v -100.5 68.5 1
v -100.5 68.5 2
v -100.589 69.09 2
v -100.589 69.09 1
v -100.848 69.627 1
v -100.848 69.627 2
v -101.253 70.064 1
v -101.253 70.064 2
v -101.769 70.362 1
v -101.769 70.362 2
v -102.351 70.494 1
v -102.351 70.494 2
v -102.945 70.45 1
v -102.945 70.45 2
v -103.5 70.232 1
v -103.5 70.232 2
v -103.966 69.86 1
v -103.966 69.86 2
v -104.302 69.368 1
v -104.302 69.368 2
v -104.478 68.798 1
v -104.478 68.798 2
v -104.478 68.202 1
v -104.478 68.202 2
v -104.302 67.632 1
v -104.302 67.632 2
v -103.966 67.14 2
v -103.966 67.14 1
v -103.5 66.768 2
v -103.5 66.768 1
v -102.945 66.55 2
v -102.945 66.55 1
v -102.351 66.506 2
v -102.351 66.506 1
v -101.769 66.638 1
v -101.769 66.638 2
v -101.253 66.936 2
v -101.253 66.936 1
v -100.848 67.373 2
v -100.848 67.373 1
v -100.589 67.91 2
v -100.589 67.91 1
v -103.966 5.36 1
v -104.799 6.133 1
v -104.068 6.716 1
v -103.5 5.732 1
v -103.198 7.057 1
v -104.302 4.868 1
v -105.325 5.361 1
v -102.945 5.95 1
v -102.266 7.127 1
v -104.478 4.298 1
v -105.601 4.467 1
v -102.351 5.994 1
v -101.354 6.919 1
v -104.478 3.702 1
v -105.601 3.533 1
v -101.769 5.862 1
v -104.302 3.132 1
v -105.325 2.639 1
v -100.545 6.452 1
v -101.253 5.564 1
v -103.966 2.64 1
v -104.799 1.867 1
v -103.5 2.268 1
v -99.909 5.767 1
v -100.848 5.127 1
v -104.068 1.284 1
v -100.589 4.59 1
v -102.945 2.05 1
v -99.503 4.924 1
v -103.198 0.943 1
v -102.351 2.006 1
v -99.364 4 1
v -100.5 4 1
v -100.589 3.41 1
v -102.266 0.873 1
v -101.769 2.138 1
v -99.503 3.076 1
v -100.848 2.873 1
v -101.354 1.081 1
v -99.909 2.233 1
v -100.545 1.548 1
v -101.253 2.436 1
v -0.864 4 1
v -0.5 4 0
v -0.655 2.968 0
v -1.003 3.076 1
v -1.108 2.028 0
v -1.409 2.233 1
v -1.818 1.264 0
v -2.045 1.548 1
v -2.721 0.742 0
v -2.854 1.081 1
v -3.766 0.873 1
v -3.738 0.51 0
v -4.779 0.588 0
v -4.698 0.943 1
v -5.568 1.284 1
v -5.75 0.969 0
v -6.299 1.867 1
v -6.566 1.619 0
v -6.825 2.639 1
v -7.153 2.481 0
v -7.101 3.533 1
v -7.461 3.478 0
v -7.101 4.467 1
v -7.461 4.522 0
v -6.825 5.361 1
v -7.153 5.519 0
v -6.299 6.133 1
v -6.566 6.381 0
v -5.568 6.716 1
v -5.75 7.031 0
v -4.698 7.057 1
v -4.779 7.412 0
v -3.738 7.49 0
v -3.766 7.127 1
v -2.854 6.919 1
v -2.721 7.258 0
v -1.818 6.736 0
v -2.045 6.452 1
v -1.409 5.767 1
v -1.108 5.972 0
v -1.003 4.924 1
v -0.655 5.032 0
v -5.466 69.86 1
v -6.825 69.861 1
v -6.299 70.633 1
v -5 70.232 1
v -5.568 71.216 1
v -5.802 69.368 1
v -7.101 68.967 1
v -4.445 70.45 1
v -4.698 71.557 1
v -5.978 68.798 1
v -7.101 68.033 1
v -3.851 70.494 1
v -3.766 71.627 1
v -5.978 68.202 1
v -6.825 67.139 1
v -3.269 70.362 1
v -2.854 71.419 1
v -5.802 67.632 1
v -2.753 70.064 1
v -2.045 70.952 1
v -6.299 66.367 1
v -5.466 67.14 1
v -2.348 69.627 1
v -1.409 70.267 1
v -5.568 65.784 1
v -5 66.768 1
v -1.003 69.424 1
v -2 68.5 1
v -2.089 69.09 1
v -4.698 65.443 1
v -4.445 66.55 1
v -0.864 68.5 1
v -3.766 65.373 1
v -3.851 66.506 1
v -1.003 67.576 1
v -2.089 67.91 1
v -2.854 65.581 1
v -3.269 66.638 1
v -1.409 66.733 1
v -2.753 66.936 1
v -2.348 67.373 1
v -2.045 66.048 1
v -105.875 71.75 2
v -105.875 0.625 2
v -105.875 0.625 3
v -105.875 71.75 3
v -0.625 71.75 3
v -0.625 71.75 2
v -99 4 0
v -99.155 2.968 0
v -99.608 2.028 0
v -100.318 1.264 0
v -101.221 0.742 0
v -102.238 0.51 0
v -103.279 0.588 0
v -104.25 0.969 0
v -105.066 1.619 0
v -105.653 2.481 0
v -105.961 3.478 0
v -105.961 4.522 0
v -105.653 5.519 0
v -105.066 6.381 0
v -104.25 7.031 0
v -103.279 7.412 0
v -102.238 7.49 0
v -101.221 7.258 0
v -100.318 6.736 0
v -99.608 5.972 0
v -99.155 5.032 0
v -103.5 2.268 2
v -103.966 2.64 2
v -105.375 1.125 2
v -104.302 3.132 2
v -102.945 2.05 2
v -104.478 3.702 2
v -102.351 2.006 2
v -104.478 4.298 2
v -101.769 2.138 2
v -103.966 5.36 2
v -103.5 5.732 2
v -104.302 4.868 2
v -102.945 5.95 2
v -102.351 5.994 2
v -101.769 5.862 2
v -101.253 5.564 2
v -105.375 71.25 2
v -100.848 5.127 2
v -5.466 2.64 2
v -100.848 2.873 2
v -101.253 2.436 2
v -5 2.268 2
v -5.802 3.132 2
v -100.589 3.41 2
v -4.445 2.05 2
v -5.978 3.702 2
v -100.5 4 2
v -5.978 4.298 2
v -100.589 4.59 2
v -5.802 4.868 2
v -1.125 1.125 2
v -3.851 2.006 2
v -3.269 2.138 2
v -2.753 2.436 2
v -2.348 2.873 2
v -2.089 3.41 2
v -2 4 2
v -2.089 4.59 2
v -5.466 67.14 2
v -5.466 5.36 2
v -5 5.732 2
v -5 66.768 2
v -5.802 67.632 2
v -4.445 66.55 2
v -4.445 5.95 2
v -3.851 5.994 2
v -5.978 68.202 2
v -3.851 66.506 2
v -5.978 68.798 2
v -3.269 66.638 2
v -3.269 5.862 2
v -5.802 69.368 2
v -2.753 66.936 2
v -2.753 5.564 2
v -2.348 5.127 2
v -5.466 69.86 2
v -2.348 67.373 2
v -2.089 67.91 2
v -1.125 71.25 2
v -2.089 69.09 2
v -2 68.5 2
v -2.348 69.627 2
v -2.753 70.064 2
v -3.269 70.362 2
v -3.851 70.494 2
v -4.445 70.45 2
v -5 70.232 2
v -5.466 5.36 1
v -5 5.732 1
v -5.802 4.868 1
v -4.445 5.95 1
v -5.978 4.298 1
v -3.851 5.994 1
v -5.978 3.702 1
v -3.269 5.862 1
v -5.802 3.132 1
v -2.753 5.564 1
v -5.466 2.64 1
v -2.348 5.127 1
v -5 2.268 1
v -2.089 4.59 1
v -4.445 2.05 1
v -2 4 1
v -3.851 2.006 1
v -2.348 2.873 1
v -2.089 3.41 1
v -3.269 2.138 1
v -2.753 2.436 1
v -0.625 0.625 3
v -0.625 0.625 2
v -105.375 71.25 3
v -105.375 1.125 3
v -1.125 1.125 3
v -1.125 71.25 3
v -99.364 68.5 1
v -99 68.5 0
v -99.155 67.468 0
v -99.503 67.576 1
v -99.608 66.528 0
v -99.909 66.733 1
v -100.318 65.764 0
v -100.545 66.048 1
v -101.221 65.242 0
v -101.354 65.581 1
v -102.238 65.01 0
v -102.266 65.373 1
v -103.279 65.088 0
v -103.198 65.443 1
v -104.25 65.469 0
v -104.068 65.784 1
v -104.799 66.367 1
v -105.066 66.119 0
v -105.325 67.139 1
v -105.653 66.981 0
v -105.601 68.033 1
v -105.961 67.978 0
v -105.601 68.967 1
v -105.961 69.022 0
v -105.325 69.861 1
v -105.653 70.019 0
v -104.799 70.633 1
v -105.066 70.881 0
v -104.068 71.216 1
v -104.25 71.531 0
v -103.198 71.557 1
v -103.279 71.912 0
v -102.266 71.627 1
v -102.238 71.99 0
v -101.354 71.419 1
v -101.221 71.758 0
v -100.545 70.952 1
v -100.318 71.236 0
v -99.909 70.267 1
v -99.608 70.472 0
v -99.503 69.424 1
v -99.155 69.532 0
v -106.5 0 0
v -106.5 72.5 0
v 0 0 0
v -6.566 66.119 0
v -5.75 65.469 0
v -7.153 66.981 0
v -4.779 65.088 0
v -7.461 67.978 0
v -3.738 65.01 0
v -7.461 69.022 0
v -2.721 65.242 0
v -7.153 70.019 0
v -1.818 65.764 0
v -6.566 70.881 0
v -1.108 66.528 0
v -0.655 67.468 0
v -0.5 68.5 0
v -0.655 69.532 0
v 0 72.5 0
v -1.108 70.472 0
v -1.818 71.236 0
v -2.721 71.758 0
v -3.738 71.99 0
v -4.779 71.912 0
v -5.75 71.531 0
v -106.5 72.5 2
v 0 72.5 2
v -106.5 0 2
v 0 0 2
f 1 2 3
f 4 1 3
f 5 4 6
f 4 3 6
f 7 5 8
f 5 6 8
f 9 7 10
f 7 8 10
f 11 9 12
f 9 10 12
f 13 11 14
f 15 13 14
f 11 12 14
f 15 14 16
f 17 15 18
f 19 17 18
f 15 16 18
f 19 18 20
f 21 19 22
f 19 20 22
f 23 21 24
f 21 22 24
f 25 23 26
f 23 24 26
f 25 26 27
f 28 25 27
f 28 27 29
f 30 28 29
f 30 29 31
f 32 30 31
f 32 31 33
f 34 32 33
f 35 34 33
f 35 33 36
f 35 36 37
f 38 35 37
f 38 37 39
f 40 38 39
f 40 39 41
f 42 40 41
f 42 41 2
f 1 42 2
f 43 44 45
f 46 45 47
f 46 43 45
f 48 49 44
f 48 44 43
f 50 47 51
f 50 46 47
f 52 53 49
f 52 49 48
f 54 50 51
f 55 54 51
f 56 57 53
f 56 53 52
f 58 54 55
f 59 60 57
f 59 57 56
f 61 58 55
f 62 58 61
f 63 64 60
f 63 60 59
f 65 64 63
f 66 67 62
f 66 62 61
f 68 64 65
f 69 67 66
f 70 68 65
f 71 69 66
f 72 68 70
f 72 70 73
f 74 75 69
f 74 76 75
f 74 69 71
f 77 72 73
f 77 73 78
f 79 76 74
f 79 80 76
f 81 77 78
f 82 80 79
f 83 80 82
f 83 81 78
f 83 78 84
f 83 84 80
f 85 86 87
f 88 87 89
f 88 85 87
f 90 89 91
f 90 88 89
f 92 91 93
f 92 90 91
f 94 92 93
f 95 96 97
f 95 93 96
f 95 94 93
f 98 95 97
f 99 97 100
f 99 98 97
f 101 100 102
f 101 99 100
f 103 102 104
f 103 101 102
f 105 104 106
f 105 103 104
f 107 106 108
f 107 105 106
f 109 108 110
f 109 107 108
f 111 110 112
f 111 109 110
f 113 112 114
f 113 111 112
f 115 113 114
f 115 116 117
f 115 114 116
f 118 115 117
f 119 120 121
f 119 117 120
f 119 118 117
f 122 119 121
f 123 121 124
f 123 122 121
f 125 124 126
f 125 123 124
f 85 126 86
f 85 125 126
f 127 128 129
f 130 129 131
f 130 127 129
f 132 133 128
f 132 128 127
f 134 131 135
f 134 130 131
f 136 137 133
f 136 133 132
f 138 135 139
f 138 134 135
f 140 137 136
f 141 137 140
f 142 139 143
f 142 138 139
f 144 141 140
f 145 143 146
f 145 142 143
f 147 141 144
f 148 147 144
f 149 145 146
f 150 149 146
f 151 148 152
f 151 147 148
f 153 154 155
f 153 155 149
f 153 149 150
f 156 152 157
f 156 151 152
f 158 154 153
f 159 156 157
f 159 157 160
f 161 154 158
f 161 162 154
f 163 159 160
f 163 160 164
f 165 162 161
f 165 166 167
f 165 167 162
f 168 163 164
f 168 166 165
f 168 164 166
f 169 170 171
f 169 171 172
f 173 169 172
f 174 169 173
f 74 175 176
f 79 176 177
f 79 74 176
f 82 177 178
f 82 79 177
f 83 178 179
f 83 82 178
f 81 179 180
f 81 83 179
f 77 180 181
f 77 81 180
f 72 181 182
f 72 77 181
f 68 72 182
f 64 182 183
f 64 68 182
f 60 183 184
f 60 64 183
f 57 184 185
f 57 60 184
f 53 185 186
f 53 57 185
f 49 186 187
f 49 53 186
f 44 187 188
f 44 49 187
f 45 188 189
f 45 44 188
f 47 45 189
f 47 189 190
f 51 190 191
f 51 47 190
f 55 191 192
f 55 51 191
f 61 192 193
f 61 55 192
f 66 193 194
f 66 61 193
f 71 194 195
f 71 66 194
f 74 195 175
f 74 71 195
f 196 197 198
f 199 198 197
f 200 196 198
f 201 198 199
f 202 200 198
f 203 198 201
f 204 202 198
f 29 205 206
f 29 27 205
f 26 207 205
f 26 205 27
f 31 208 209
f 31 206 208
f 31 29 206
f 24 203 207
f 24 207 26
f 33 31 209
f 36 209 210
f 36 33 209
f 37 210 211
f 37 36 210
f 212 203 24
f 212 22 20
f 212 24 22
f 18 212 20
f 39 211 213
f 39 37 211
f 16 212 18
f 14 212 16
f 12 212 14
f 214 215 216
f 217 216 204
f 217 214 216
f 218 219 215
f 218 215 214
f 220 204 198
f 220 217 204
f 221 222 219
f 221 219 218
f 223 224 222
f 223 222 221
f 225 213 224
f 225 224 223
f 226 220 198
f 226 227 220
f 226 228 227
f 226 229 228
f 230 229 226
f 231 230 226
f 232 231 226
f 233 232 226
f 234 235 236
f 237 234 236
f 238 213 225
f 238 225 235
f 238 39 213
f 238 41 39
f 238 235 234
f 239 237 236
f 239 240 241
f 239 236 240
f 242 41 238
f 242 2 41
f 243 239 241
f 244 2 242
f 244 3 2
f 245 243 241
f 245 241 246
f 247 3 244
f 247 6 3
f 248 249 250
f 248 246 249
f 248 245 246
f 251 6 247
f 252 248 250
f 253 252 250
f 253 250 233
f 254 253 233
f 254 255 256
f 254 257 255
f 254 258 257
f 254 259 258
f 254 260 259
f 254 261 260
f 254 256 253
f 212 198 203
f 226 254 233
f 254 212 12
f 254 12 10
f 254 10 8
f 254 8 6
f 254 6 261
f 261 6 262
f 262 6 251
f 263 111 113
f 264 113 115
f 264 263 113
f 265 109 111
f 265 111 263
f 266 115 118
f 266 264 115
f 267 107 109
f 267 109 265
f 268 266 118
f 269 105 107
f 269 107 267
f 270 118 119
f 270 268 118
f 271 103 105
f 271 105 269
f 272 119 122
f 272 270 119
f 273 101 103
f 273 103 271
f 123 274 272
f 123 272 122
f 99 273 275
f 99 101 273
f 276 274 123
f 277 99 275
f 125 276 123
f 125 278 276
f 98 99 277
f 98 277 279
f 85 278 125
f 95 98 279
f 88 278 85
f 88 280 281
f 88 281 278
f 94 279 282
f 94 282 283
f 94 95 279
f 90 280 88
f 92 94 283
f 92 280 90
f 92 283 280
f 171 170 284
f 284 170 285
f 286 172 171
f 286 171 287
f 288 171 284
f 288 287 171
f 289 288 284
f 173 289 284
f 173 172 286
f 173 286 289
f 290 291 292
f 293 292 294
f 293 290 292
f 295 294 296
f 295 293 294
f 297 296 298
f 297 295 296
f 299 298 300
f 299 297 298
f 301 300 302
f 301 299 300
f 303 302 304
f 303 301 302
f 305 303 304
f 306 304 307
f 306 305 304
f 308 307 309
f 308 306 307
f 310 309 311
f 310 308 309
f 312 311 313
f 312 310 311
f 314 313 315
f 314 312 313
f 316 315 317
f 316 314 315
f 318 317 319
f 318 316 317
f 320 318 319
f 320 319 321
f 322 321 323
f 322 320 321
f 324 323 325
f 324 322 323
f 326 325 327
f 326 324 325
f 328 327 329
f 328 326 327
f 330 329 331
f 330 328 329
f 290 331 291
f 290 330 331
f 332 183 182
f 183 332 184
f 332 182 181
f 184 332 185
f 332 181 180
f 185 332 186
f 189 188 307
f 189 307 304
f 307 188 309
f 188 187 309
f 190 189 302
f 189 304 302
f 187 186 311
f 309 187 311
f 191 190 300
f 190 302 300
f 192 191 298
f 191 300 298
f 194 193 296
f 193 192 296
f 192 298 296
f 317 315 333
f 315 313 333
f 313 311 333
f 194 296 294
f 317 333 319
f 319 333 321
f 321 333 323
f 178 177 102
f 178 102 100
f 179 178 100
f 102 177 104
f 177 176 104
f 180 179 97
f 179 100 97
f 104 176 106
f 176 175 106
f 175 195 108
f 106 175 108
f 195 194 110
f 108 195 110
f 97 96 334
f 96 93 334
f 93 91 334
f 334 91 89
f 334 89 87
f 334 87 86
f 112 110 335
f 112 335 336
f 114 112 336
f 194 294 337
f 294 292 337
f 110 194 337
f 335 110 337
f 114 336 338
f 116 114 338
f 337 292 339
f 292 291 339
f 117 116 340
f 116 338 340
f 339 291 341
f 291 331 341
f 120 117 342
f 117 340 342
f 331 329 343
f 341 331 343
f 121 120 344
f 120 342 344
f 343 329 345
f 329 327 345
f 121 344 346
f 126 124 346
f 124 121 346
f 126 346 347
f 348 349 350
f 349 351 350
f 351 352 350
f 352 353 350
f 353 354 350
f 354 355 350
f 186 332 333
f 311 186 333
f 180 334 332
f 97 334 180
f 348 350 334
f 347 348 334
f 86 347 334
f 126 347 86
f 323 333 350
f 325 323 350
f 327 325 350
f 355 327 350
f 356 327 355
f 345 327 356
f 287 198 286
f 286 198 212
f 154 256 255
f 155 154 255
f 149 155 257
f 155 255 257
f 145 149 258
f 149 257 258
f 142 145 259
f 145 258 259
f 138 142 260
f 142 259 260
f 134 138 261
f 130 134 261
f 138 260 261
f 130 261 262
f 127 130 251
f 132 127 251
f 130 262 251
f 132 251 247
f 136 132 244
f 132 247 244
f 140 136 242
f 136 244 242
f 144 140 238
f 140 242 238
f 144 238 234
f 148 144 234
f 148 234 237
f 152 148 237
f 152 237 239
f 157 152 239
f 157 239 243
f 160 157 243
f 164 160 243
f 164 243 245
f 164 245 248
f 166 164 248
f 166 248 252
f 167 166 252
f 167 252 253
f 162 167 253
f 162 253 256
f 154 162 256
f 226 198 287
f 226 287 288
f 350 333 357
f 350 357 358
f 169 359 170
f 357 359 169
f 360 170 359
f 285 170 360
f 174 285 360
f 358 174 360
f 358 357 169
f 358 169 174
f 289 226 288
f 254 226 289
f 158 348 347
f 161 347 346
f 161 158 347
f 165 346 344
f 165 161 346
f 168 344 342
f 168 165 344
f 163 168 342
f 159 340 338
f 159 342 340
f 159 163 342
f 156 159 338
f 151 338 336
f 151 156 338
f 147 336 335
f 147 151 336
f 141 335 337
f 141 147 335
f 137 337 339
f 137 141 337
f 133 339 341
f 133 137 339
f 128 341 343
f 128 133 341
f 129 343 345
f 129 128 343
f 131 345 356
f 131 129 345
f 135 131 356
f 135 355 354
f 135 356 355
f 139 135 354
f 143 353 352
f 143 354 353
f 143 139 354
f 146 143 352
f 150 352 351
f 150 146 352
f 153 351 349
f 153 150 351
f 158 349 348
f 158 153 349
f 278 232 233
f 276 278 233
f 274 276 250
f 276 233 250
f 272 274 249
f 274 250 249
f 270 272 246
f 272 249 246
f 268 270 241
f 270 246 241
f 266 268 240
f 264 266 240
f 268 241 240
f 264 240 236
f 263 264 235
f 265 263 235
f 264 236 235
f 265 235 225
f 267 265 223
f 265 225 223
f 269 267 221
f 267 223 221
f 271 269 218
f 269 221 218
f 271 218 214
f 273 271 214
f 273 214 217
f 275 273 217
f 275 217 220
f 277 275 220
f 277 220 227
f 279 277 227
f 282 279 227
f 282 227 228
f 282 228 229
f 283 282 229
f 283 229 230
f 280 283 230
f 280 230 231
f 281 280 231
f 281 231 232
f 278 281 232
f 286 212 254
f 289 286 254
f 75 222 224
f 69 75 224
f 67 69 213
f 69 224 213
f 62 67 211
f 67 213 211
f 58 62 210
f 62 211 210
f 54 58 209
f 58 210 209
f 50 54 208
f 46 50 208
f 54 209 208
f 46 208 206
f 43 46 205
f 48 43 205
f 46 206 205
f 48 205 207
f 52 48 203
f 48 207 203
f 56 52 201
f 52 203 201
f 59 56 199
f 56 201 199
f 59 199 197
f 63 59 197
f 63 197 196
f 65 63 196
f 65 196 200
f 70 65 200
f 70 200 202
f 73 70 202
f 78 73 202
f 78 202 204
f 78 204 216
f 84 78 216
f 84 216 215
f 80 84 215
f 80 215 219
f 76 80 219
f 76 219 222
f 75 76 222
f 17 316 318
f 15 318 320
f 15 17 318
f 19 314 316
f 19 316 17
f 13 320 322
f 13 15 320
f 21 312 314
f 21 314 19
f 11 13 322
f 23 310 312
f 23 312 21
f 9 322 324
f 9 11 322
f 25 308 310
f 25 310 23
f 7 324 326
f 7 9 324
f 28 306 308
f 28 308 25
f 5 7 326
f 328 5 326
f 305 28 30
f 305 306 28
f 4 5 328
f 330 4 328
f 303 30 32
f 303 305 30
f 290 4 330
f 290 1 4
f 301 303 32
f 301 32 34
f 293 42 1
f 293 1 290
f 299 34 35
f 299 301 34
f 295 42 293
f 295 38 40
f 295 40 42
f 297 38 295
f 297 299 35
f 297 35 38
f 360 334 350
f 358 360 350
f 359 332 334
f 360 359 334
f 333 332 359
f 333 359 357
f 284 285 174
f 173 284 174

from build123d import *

# Parameters (mm, degrees)
F0_W     = 106.5
F0_H     = 72.5
F1_DEPTH = 2
F2_R     = 2
F3_DEPTH = 2
F4_R     = 3.5
F5_DEPTH = 1
F5_TAPER = 20
F6_W     = 105.25
F6_H     = 71.125
F6_W_2   = 104.25
F6_H_2   = 70.125
F7_DEPTH = 1


with BuildPart() as f1:
    # F0 (on Top) → F1 (new body)
    with BuildSketch(Plane.XY):
        with Locations((-53.25, 36.25)):
            Rectangle(F0_W, F0_H)
    extrude(amount=F1_DEPTH)

    # F2 (on face) → F3 (cut, through all)
    with BuildSketch(Plane.XY.offset(2)):
        with Locations((-102.5, 68.5)):
            Circle(F2_R)
        with Locations((-4, 68.5)):
            Circle(F2_R)
        with Locations((-4, 4)):
            Circle(F2_R)
        with Locations((-102.5, 4)):
            Circle(F2_R)
    extrude(amount=-F3_DEPTH, mode=Mode.SUBTRACT)

    # F4 (on face) → F5 (cut)
    with BuildSketch(Plane(origin=(0, 0, 0), x_dir=(1, 0, 0), z_dir=(0, 0, -1))):
        with Locations((-102.5, -4)):
            Circle(F4_R)
        with Locations((-4, -4)):
            Circle(F4_R)
        with Locations((-102.5, -68.5)):
            Circle(F4_R)
        with Locations((-4, -68.5)):
            Circle(F4_R)
    extrude(amount=-F5_DEPTH, taper=F5_TAPER, mode=Mode.SUBTRACT)

    # F6 (on face) → F7 (join)
    with BuildSketch(Plane.XY.offset(2)):
        with Locations((-53.25, 36.1875)):
            Rectangle(F6_W, F6_H)
        with Locations((-53.25, 36.1875)):
            Rectangle(F6_W_2, F6_H_2, mode=Mode.SUBTRACT)
    extrude(amount=F7_DEPTH)


solid = f1.part
